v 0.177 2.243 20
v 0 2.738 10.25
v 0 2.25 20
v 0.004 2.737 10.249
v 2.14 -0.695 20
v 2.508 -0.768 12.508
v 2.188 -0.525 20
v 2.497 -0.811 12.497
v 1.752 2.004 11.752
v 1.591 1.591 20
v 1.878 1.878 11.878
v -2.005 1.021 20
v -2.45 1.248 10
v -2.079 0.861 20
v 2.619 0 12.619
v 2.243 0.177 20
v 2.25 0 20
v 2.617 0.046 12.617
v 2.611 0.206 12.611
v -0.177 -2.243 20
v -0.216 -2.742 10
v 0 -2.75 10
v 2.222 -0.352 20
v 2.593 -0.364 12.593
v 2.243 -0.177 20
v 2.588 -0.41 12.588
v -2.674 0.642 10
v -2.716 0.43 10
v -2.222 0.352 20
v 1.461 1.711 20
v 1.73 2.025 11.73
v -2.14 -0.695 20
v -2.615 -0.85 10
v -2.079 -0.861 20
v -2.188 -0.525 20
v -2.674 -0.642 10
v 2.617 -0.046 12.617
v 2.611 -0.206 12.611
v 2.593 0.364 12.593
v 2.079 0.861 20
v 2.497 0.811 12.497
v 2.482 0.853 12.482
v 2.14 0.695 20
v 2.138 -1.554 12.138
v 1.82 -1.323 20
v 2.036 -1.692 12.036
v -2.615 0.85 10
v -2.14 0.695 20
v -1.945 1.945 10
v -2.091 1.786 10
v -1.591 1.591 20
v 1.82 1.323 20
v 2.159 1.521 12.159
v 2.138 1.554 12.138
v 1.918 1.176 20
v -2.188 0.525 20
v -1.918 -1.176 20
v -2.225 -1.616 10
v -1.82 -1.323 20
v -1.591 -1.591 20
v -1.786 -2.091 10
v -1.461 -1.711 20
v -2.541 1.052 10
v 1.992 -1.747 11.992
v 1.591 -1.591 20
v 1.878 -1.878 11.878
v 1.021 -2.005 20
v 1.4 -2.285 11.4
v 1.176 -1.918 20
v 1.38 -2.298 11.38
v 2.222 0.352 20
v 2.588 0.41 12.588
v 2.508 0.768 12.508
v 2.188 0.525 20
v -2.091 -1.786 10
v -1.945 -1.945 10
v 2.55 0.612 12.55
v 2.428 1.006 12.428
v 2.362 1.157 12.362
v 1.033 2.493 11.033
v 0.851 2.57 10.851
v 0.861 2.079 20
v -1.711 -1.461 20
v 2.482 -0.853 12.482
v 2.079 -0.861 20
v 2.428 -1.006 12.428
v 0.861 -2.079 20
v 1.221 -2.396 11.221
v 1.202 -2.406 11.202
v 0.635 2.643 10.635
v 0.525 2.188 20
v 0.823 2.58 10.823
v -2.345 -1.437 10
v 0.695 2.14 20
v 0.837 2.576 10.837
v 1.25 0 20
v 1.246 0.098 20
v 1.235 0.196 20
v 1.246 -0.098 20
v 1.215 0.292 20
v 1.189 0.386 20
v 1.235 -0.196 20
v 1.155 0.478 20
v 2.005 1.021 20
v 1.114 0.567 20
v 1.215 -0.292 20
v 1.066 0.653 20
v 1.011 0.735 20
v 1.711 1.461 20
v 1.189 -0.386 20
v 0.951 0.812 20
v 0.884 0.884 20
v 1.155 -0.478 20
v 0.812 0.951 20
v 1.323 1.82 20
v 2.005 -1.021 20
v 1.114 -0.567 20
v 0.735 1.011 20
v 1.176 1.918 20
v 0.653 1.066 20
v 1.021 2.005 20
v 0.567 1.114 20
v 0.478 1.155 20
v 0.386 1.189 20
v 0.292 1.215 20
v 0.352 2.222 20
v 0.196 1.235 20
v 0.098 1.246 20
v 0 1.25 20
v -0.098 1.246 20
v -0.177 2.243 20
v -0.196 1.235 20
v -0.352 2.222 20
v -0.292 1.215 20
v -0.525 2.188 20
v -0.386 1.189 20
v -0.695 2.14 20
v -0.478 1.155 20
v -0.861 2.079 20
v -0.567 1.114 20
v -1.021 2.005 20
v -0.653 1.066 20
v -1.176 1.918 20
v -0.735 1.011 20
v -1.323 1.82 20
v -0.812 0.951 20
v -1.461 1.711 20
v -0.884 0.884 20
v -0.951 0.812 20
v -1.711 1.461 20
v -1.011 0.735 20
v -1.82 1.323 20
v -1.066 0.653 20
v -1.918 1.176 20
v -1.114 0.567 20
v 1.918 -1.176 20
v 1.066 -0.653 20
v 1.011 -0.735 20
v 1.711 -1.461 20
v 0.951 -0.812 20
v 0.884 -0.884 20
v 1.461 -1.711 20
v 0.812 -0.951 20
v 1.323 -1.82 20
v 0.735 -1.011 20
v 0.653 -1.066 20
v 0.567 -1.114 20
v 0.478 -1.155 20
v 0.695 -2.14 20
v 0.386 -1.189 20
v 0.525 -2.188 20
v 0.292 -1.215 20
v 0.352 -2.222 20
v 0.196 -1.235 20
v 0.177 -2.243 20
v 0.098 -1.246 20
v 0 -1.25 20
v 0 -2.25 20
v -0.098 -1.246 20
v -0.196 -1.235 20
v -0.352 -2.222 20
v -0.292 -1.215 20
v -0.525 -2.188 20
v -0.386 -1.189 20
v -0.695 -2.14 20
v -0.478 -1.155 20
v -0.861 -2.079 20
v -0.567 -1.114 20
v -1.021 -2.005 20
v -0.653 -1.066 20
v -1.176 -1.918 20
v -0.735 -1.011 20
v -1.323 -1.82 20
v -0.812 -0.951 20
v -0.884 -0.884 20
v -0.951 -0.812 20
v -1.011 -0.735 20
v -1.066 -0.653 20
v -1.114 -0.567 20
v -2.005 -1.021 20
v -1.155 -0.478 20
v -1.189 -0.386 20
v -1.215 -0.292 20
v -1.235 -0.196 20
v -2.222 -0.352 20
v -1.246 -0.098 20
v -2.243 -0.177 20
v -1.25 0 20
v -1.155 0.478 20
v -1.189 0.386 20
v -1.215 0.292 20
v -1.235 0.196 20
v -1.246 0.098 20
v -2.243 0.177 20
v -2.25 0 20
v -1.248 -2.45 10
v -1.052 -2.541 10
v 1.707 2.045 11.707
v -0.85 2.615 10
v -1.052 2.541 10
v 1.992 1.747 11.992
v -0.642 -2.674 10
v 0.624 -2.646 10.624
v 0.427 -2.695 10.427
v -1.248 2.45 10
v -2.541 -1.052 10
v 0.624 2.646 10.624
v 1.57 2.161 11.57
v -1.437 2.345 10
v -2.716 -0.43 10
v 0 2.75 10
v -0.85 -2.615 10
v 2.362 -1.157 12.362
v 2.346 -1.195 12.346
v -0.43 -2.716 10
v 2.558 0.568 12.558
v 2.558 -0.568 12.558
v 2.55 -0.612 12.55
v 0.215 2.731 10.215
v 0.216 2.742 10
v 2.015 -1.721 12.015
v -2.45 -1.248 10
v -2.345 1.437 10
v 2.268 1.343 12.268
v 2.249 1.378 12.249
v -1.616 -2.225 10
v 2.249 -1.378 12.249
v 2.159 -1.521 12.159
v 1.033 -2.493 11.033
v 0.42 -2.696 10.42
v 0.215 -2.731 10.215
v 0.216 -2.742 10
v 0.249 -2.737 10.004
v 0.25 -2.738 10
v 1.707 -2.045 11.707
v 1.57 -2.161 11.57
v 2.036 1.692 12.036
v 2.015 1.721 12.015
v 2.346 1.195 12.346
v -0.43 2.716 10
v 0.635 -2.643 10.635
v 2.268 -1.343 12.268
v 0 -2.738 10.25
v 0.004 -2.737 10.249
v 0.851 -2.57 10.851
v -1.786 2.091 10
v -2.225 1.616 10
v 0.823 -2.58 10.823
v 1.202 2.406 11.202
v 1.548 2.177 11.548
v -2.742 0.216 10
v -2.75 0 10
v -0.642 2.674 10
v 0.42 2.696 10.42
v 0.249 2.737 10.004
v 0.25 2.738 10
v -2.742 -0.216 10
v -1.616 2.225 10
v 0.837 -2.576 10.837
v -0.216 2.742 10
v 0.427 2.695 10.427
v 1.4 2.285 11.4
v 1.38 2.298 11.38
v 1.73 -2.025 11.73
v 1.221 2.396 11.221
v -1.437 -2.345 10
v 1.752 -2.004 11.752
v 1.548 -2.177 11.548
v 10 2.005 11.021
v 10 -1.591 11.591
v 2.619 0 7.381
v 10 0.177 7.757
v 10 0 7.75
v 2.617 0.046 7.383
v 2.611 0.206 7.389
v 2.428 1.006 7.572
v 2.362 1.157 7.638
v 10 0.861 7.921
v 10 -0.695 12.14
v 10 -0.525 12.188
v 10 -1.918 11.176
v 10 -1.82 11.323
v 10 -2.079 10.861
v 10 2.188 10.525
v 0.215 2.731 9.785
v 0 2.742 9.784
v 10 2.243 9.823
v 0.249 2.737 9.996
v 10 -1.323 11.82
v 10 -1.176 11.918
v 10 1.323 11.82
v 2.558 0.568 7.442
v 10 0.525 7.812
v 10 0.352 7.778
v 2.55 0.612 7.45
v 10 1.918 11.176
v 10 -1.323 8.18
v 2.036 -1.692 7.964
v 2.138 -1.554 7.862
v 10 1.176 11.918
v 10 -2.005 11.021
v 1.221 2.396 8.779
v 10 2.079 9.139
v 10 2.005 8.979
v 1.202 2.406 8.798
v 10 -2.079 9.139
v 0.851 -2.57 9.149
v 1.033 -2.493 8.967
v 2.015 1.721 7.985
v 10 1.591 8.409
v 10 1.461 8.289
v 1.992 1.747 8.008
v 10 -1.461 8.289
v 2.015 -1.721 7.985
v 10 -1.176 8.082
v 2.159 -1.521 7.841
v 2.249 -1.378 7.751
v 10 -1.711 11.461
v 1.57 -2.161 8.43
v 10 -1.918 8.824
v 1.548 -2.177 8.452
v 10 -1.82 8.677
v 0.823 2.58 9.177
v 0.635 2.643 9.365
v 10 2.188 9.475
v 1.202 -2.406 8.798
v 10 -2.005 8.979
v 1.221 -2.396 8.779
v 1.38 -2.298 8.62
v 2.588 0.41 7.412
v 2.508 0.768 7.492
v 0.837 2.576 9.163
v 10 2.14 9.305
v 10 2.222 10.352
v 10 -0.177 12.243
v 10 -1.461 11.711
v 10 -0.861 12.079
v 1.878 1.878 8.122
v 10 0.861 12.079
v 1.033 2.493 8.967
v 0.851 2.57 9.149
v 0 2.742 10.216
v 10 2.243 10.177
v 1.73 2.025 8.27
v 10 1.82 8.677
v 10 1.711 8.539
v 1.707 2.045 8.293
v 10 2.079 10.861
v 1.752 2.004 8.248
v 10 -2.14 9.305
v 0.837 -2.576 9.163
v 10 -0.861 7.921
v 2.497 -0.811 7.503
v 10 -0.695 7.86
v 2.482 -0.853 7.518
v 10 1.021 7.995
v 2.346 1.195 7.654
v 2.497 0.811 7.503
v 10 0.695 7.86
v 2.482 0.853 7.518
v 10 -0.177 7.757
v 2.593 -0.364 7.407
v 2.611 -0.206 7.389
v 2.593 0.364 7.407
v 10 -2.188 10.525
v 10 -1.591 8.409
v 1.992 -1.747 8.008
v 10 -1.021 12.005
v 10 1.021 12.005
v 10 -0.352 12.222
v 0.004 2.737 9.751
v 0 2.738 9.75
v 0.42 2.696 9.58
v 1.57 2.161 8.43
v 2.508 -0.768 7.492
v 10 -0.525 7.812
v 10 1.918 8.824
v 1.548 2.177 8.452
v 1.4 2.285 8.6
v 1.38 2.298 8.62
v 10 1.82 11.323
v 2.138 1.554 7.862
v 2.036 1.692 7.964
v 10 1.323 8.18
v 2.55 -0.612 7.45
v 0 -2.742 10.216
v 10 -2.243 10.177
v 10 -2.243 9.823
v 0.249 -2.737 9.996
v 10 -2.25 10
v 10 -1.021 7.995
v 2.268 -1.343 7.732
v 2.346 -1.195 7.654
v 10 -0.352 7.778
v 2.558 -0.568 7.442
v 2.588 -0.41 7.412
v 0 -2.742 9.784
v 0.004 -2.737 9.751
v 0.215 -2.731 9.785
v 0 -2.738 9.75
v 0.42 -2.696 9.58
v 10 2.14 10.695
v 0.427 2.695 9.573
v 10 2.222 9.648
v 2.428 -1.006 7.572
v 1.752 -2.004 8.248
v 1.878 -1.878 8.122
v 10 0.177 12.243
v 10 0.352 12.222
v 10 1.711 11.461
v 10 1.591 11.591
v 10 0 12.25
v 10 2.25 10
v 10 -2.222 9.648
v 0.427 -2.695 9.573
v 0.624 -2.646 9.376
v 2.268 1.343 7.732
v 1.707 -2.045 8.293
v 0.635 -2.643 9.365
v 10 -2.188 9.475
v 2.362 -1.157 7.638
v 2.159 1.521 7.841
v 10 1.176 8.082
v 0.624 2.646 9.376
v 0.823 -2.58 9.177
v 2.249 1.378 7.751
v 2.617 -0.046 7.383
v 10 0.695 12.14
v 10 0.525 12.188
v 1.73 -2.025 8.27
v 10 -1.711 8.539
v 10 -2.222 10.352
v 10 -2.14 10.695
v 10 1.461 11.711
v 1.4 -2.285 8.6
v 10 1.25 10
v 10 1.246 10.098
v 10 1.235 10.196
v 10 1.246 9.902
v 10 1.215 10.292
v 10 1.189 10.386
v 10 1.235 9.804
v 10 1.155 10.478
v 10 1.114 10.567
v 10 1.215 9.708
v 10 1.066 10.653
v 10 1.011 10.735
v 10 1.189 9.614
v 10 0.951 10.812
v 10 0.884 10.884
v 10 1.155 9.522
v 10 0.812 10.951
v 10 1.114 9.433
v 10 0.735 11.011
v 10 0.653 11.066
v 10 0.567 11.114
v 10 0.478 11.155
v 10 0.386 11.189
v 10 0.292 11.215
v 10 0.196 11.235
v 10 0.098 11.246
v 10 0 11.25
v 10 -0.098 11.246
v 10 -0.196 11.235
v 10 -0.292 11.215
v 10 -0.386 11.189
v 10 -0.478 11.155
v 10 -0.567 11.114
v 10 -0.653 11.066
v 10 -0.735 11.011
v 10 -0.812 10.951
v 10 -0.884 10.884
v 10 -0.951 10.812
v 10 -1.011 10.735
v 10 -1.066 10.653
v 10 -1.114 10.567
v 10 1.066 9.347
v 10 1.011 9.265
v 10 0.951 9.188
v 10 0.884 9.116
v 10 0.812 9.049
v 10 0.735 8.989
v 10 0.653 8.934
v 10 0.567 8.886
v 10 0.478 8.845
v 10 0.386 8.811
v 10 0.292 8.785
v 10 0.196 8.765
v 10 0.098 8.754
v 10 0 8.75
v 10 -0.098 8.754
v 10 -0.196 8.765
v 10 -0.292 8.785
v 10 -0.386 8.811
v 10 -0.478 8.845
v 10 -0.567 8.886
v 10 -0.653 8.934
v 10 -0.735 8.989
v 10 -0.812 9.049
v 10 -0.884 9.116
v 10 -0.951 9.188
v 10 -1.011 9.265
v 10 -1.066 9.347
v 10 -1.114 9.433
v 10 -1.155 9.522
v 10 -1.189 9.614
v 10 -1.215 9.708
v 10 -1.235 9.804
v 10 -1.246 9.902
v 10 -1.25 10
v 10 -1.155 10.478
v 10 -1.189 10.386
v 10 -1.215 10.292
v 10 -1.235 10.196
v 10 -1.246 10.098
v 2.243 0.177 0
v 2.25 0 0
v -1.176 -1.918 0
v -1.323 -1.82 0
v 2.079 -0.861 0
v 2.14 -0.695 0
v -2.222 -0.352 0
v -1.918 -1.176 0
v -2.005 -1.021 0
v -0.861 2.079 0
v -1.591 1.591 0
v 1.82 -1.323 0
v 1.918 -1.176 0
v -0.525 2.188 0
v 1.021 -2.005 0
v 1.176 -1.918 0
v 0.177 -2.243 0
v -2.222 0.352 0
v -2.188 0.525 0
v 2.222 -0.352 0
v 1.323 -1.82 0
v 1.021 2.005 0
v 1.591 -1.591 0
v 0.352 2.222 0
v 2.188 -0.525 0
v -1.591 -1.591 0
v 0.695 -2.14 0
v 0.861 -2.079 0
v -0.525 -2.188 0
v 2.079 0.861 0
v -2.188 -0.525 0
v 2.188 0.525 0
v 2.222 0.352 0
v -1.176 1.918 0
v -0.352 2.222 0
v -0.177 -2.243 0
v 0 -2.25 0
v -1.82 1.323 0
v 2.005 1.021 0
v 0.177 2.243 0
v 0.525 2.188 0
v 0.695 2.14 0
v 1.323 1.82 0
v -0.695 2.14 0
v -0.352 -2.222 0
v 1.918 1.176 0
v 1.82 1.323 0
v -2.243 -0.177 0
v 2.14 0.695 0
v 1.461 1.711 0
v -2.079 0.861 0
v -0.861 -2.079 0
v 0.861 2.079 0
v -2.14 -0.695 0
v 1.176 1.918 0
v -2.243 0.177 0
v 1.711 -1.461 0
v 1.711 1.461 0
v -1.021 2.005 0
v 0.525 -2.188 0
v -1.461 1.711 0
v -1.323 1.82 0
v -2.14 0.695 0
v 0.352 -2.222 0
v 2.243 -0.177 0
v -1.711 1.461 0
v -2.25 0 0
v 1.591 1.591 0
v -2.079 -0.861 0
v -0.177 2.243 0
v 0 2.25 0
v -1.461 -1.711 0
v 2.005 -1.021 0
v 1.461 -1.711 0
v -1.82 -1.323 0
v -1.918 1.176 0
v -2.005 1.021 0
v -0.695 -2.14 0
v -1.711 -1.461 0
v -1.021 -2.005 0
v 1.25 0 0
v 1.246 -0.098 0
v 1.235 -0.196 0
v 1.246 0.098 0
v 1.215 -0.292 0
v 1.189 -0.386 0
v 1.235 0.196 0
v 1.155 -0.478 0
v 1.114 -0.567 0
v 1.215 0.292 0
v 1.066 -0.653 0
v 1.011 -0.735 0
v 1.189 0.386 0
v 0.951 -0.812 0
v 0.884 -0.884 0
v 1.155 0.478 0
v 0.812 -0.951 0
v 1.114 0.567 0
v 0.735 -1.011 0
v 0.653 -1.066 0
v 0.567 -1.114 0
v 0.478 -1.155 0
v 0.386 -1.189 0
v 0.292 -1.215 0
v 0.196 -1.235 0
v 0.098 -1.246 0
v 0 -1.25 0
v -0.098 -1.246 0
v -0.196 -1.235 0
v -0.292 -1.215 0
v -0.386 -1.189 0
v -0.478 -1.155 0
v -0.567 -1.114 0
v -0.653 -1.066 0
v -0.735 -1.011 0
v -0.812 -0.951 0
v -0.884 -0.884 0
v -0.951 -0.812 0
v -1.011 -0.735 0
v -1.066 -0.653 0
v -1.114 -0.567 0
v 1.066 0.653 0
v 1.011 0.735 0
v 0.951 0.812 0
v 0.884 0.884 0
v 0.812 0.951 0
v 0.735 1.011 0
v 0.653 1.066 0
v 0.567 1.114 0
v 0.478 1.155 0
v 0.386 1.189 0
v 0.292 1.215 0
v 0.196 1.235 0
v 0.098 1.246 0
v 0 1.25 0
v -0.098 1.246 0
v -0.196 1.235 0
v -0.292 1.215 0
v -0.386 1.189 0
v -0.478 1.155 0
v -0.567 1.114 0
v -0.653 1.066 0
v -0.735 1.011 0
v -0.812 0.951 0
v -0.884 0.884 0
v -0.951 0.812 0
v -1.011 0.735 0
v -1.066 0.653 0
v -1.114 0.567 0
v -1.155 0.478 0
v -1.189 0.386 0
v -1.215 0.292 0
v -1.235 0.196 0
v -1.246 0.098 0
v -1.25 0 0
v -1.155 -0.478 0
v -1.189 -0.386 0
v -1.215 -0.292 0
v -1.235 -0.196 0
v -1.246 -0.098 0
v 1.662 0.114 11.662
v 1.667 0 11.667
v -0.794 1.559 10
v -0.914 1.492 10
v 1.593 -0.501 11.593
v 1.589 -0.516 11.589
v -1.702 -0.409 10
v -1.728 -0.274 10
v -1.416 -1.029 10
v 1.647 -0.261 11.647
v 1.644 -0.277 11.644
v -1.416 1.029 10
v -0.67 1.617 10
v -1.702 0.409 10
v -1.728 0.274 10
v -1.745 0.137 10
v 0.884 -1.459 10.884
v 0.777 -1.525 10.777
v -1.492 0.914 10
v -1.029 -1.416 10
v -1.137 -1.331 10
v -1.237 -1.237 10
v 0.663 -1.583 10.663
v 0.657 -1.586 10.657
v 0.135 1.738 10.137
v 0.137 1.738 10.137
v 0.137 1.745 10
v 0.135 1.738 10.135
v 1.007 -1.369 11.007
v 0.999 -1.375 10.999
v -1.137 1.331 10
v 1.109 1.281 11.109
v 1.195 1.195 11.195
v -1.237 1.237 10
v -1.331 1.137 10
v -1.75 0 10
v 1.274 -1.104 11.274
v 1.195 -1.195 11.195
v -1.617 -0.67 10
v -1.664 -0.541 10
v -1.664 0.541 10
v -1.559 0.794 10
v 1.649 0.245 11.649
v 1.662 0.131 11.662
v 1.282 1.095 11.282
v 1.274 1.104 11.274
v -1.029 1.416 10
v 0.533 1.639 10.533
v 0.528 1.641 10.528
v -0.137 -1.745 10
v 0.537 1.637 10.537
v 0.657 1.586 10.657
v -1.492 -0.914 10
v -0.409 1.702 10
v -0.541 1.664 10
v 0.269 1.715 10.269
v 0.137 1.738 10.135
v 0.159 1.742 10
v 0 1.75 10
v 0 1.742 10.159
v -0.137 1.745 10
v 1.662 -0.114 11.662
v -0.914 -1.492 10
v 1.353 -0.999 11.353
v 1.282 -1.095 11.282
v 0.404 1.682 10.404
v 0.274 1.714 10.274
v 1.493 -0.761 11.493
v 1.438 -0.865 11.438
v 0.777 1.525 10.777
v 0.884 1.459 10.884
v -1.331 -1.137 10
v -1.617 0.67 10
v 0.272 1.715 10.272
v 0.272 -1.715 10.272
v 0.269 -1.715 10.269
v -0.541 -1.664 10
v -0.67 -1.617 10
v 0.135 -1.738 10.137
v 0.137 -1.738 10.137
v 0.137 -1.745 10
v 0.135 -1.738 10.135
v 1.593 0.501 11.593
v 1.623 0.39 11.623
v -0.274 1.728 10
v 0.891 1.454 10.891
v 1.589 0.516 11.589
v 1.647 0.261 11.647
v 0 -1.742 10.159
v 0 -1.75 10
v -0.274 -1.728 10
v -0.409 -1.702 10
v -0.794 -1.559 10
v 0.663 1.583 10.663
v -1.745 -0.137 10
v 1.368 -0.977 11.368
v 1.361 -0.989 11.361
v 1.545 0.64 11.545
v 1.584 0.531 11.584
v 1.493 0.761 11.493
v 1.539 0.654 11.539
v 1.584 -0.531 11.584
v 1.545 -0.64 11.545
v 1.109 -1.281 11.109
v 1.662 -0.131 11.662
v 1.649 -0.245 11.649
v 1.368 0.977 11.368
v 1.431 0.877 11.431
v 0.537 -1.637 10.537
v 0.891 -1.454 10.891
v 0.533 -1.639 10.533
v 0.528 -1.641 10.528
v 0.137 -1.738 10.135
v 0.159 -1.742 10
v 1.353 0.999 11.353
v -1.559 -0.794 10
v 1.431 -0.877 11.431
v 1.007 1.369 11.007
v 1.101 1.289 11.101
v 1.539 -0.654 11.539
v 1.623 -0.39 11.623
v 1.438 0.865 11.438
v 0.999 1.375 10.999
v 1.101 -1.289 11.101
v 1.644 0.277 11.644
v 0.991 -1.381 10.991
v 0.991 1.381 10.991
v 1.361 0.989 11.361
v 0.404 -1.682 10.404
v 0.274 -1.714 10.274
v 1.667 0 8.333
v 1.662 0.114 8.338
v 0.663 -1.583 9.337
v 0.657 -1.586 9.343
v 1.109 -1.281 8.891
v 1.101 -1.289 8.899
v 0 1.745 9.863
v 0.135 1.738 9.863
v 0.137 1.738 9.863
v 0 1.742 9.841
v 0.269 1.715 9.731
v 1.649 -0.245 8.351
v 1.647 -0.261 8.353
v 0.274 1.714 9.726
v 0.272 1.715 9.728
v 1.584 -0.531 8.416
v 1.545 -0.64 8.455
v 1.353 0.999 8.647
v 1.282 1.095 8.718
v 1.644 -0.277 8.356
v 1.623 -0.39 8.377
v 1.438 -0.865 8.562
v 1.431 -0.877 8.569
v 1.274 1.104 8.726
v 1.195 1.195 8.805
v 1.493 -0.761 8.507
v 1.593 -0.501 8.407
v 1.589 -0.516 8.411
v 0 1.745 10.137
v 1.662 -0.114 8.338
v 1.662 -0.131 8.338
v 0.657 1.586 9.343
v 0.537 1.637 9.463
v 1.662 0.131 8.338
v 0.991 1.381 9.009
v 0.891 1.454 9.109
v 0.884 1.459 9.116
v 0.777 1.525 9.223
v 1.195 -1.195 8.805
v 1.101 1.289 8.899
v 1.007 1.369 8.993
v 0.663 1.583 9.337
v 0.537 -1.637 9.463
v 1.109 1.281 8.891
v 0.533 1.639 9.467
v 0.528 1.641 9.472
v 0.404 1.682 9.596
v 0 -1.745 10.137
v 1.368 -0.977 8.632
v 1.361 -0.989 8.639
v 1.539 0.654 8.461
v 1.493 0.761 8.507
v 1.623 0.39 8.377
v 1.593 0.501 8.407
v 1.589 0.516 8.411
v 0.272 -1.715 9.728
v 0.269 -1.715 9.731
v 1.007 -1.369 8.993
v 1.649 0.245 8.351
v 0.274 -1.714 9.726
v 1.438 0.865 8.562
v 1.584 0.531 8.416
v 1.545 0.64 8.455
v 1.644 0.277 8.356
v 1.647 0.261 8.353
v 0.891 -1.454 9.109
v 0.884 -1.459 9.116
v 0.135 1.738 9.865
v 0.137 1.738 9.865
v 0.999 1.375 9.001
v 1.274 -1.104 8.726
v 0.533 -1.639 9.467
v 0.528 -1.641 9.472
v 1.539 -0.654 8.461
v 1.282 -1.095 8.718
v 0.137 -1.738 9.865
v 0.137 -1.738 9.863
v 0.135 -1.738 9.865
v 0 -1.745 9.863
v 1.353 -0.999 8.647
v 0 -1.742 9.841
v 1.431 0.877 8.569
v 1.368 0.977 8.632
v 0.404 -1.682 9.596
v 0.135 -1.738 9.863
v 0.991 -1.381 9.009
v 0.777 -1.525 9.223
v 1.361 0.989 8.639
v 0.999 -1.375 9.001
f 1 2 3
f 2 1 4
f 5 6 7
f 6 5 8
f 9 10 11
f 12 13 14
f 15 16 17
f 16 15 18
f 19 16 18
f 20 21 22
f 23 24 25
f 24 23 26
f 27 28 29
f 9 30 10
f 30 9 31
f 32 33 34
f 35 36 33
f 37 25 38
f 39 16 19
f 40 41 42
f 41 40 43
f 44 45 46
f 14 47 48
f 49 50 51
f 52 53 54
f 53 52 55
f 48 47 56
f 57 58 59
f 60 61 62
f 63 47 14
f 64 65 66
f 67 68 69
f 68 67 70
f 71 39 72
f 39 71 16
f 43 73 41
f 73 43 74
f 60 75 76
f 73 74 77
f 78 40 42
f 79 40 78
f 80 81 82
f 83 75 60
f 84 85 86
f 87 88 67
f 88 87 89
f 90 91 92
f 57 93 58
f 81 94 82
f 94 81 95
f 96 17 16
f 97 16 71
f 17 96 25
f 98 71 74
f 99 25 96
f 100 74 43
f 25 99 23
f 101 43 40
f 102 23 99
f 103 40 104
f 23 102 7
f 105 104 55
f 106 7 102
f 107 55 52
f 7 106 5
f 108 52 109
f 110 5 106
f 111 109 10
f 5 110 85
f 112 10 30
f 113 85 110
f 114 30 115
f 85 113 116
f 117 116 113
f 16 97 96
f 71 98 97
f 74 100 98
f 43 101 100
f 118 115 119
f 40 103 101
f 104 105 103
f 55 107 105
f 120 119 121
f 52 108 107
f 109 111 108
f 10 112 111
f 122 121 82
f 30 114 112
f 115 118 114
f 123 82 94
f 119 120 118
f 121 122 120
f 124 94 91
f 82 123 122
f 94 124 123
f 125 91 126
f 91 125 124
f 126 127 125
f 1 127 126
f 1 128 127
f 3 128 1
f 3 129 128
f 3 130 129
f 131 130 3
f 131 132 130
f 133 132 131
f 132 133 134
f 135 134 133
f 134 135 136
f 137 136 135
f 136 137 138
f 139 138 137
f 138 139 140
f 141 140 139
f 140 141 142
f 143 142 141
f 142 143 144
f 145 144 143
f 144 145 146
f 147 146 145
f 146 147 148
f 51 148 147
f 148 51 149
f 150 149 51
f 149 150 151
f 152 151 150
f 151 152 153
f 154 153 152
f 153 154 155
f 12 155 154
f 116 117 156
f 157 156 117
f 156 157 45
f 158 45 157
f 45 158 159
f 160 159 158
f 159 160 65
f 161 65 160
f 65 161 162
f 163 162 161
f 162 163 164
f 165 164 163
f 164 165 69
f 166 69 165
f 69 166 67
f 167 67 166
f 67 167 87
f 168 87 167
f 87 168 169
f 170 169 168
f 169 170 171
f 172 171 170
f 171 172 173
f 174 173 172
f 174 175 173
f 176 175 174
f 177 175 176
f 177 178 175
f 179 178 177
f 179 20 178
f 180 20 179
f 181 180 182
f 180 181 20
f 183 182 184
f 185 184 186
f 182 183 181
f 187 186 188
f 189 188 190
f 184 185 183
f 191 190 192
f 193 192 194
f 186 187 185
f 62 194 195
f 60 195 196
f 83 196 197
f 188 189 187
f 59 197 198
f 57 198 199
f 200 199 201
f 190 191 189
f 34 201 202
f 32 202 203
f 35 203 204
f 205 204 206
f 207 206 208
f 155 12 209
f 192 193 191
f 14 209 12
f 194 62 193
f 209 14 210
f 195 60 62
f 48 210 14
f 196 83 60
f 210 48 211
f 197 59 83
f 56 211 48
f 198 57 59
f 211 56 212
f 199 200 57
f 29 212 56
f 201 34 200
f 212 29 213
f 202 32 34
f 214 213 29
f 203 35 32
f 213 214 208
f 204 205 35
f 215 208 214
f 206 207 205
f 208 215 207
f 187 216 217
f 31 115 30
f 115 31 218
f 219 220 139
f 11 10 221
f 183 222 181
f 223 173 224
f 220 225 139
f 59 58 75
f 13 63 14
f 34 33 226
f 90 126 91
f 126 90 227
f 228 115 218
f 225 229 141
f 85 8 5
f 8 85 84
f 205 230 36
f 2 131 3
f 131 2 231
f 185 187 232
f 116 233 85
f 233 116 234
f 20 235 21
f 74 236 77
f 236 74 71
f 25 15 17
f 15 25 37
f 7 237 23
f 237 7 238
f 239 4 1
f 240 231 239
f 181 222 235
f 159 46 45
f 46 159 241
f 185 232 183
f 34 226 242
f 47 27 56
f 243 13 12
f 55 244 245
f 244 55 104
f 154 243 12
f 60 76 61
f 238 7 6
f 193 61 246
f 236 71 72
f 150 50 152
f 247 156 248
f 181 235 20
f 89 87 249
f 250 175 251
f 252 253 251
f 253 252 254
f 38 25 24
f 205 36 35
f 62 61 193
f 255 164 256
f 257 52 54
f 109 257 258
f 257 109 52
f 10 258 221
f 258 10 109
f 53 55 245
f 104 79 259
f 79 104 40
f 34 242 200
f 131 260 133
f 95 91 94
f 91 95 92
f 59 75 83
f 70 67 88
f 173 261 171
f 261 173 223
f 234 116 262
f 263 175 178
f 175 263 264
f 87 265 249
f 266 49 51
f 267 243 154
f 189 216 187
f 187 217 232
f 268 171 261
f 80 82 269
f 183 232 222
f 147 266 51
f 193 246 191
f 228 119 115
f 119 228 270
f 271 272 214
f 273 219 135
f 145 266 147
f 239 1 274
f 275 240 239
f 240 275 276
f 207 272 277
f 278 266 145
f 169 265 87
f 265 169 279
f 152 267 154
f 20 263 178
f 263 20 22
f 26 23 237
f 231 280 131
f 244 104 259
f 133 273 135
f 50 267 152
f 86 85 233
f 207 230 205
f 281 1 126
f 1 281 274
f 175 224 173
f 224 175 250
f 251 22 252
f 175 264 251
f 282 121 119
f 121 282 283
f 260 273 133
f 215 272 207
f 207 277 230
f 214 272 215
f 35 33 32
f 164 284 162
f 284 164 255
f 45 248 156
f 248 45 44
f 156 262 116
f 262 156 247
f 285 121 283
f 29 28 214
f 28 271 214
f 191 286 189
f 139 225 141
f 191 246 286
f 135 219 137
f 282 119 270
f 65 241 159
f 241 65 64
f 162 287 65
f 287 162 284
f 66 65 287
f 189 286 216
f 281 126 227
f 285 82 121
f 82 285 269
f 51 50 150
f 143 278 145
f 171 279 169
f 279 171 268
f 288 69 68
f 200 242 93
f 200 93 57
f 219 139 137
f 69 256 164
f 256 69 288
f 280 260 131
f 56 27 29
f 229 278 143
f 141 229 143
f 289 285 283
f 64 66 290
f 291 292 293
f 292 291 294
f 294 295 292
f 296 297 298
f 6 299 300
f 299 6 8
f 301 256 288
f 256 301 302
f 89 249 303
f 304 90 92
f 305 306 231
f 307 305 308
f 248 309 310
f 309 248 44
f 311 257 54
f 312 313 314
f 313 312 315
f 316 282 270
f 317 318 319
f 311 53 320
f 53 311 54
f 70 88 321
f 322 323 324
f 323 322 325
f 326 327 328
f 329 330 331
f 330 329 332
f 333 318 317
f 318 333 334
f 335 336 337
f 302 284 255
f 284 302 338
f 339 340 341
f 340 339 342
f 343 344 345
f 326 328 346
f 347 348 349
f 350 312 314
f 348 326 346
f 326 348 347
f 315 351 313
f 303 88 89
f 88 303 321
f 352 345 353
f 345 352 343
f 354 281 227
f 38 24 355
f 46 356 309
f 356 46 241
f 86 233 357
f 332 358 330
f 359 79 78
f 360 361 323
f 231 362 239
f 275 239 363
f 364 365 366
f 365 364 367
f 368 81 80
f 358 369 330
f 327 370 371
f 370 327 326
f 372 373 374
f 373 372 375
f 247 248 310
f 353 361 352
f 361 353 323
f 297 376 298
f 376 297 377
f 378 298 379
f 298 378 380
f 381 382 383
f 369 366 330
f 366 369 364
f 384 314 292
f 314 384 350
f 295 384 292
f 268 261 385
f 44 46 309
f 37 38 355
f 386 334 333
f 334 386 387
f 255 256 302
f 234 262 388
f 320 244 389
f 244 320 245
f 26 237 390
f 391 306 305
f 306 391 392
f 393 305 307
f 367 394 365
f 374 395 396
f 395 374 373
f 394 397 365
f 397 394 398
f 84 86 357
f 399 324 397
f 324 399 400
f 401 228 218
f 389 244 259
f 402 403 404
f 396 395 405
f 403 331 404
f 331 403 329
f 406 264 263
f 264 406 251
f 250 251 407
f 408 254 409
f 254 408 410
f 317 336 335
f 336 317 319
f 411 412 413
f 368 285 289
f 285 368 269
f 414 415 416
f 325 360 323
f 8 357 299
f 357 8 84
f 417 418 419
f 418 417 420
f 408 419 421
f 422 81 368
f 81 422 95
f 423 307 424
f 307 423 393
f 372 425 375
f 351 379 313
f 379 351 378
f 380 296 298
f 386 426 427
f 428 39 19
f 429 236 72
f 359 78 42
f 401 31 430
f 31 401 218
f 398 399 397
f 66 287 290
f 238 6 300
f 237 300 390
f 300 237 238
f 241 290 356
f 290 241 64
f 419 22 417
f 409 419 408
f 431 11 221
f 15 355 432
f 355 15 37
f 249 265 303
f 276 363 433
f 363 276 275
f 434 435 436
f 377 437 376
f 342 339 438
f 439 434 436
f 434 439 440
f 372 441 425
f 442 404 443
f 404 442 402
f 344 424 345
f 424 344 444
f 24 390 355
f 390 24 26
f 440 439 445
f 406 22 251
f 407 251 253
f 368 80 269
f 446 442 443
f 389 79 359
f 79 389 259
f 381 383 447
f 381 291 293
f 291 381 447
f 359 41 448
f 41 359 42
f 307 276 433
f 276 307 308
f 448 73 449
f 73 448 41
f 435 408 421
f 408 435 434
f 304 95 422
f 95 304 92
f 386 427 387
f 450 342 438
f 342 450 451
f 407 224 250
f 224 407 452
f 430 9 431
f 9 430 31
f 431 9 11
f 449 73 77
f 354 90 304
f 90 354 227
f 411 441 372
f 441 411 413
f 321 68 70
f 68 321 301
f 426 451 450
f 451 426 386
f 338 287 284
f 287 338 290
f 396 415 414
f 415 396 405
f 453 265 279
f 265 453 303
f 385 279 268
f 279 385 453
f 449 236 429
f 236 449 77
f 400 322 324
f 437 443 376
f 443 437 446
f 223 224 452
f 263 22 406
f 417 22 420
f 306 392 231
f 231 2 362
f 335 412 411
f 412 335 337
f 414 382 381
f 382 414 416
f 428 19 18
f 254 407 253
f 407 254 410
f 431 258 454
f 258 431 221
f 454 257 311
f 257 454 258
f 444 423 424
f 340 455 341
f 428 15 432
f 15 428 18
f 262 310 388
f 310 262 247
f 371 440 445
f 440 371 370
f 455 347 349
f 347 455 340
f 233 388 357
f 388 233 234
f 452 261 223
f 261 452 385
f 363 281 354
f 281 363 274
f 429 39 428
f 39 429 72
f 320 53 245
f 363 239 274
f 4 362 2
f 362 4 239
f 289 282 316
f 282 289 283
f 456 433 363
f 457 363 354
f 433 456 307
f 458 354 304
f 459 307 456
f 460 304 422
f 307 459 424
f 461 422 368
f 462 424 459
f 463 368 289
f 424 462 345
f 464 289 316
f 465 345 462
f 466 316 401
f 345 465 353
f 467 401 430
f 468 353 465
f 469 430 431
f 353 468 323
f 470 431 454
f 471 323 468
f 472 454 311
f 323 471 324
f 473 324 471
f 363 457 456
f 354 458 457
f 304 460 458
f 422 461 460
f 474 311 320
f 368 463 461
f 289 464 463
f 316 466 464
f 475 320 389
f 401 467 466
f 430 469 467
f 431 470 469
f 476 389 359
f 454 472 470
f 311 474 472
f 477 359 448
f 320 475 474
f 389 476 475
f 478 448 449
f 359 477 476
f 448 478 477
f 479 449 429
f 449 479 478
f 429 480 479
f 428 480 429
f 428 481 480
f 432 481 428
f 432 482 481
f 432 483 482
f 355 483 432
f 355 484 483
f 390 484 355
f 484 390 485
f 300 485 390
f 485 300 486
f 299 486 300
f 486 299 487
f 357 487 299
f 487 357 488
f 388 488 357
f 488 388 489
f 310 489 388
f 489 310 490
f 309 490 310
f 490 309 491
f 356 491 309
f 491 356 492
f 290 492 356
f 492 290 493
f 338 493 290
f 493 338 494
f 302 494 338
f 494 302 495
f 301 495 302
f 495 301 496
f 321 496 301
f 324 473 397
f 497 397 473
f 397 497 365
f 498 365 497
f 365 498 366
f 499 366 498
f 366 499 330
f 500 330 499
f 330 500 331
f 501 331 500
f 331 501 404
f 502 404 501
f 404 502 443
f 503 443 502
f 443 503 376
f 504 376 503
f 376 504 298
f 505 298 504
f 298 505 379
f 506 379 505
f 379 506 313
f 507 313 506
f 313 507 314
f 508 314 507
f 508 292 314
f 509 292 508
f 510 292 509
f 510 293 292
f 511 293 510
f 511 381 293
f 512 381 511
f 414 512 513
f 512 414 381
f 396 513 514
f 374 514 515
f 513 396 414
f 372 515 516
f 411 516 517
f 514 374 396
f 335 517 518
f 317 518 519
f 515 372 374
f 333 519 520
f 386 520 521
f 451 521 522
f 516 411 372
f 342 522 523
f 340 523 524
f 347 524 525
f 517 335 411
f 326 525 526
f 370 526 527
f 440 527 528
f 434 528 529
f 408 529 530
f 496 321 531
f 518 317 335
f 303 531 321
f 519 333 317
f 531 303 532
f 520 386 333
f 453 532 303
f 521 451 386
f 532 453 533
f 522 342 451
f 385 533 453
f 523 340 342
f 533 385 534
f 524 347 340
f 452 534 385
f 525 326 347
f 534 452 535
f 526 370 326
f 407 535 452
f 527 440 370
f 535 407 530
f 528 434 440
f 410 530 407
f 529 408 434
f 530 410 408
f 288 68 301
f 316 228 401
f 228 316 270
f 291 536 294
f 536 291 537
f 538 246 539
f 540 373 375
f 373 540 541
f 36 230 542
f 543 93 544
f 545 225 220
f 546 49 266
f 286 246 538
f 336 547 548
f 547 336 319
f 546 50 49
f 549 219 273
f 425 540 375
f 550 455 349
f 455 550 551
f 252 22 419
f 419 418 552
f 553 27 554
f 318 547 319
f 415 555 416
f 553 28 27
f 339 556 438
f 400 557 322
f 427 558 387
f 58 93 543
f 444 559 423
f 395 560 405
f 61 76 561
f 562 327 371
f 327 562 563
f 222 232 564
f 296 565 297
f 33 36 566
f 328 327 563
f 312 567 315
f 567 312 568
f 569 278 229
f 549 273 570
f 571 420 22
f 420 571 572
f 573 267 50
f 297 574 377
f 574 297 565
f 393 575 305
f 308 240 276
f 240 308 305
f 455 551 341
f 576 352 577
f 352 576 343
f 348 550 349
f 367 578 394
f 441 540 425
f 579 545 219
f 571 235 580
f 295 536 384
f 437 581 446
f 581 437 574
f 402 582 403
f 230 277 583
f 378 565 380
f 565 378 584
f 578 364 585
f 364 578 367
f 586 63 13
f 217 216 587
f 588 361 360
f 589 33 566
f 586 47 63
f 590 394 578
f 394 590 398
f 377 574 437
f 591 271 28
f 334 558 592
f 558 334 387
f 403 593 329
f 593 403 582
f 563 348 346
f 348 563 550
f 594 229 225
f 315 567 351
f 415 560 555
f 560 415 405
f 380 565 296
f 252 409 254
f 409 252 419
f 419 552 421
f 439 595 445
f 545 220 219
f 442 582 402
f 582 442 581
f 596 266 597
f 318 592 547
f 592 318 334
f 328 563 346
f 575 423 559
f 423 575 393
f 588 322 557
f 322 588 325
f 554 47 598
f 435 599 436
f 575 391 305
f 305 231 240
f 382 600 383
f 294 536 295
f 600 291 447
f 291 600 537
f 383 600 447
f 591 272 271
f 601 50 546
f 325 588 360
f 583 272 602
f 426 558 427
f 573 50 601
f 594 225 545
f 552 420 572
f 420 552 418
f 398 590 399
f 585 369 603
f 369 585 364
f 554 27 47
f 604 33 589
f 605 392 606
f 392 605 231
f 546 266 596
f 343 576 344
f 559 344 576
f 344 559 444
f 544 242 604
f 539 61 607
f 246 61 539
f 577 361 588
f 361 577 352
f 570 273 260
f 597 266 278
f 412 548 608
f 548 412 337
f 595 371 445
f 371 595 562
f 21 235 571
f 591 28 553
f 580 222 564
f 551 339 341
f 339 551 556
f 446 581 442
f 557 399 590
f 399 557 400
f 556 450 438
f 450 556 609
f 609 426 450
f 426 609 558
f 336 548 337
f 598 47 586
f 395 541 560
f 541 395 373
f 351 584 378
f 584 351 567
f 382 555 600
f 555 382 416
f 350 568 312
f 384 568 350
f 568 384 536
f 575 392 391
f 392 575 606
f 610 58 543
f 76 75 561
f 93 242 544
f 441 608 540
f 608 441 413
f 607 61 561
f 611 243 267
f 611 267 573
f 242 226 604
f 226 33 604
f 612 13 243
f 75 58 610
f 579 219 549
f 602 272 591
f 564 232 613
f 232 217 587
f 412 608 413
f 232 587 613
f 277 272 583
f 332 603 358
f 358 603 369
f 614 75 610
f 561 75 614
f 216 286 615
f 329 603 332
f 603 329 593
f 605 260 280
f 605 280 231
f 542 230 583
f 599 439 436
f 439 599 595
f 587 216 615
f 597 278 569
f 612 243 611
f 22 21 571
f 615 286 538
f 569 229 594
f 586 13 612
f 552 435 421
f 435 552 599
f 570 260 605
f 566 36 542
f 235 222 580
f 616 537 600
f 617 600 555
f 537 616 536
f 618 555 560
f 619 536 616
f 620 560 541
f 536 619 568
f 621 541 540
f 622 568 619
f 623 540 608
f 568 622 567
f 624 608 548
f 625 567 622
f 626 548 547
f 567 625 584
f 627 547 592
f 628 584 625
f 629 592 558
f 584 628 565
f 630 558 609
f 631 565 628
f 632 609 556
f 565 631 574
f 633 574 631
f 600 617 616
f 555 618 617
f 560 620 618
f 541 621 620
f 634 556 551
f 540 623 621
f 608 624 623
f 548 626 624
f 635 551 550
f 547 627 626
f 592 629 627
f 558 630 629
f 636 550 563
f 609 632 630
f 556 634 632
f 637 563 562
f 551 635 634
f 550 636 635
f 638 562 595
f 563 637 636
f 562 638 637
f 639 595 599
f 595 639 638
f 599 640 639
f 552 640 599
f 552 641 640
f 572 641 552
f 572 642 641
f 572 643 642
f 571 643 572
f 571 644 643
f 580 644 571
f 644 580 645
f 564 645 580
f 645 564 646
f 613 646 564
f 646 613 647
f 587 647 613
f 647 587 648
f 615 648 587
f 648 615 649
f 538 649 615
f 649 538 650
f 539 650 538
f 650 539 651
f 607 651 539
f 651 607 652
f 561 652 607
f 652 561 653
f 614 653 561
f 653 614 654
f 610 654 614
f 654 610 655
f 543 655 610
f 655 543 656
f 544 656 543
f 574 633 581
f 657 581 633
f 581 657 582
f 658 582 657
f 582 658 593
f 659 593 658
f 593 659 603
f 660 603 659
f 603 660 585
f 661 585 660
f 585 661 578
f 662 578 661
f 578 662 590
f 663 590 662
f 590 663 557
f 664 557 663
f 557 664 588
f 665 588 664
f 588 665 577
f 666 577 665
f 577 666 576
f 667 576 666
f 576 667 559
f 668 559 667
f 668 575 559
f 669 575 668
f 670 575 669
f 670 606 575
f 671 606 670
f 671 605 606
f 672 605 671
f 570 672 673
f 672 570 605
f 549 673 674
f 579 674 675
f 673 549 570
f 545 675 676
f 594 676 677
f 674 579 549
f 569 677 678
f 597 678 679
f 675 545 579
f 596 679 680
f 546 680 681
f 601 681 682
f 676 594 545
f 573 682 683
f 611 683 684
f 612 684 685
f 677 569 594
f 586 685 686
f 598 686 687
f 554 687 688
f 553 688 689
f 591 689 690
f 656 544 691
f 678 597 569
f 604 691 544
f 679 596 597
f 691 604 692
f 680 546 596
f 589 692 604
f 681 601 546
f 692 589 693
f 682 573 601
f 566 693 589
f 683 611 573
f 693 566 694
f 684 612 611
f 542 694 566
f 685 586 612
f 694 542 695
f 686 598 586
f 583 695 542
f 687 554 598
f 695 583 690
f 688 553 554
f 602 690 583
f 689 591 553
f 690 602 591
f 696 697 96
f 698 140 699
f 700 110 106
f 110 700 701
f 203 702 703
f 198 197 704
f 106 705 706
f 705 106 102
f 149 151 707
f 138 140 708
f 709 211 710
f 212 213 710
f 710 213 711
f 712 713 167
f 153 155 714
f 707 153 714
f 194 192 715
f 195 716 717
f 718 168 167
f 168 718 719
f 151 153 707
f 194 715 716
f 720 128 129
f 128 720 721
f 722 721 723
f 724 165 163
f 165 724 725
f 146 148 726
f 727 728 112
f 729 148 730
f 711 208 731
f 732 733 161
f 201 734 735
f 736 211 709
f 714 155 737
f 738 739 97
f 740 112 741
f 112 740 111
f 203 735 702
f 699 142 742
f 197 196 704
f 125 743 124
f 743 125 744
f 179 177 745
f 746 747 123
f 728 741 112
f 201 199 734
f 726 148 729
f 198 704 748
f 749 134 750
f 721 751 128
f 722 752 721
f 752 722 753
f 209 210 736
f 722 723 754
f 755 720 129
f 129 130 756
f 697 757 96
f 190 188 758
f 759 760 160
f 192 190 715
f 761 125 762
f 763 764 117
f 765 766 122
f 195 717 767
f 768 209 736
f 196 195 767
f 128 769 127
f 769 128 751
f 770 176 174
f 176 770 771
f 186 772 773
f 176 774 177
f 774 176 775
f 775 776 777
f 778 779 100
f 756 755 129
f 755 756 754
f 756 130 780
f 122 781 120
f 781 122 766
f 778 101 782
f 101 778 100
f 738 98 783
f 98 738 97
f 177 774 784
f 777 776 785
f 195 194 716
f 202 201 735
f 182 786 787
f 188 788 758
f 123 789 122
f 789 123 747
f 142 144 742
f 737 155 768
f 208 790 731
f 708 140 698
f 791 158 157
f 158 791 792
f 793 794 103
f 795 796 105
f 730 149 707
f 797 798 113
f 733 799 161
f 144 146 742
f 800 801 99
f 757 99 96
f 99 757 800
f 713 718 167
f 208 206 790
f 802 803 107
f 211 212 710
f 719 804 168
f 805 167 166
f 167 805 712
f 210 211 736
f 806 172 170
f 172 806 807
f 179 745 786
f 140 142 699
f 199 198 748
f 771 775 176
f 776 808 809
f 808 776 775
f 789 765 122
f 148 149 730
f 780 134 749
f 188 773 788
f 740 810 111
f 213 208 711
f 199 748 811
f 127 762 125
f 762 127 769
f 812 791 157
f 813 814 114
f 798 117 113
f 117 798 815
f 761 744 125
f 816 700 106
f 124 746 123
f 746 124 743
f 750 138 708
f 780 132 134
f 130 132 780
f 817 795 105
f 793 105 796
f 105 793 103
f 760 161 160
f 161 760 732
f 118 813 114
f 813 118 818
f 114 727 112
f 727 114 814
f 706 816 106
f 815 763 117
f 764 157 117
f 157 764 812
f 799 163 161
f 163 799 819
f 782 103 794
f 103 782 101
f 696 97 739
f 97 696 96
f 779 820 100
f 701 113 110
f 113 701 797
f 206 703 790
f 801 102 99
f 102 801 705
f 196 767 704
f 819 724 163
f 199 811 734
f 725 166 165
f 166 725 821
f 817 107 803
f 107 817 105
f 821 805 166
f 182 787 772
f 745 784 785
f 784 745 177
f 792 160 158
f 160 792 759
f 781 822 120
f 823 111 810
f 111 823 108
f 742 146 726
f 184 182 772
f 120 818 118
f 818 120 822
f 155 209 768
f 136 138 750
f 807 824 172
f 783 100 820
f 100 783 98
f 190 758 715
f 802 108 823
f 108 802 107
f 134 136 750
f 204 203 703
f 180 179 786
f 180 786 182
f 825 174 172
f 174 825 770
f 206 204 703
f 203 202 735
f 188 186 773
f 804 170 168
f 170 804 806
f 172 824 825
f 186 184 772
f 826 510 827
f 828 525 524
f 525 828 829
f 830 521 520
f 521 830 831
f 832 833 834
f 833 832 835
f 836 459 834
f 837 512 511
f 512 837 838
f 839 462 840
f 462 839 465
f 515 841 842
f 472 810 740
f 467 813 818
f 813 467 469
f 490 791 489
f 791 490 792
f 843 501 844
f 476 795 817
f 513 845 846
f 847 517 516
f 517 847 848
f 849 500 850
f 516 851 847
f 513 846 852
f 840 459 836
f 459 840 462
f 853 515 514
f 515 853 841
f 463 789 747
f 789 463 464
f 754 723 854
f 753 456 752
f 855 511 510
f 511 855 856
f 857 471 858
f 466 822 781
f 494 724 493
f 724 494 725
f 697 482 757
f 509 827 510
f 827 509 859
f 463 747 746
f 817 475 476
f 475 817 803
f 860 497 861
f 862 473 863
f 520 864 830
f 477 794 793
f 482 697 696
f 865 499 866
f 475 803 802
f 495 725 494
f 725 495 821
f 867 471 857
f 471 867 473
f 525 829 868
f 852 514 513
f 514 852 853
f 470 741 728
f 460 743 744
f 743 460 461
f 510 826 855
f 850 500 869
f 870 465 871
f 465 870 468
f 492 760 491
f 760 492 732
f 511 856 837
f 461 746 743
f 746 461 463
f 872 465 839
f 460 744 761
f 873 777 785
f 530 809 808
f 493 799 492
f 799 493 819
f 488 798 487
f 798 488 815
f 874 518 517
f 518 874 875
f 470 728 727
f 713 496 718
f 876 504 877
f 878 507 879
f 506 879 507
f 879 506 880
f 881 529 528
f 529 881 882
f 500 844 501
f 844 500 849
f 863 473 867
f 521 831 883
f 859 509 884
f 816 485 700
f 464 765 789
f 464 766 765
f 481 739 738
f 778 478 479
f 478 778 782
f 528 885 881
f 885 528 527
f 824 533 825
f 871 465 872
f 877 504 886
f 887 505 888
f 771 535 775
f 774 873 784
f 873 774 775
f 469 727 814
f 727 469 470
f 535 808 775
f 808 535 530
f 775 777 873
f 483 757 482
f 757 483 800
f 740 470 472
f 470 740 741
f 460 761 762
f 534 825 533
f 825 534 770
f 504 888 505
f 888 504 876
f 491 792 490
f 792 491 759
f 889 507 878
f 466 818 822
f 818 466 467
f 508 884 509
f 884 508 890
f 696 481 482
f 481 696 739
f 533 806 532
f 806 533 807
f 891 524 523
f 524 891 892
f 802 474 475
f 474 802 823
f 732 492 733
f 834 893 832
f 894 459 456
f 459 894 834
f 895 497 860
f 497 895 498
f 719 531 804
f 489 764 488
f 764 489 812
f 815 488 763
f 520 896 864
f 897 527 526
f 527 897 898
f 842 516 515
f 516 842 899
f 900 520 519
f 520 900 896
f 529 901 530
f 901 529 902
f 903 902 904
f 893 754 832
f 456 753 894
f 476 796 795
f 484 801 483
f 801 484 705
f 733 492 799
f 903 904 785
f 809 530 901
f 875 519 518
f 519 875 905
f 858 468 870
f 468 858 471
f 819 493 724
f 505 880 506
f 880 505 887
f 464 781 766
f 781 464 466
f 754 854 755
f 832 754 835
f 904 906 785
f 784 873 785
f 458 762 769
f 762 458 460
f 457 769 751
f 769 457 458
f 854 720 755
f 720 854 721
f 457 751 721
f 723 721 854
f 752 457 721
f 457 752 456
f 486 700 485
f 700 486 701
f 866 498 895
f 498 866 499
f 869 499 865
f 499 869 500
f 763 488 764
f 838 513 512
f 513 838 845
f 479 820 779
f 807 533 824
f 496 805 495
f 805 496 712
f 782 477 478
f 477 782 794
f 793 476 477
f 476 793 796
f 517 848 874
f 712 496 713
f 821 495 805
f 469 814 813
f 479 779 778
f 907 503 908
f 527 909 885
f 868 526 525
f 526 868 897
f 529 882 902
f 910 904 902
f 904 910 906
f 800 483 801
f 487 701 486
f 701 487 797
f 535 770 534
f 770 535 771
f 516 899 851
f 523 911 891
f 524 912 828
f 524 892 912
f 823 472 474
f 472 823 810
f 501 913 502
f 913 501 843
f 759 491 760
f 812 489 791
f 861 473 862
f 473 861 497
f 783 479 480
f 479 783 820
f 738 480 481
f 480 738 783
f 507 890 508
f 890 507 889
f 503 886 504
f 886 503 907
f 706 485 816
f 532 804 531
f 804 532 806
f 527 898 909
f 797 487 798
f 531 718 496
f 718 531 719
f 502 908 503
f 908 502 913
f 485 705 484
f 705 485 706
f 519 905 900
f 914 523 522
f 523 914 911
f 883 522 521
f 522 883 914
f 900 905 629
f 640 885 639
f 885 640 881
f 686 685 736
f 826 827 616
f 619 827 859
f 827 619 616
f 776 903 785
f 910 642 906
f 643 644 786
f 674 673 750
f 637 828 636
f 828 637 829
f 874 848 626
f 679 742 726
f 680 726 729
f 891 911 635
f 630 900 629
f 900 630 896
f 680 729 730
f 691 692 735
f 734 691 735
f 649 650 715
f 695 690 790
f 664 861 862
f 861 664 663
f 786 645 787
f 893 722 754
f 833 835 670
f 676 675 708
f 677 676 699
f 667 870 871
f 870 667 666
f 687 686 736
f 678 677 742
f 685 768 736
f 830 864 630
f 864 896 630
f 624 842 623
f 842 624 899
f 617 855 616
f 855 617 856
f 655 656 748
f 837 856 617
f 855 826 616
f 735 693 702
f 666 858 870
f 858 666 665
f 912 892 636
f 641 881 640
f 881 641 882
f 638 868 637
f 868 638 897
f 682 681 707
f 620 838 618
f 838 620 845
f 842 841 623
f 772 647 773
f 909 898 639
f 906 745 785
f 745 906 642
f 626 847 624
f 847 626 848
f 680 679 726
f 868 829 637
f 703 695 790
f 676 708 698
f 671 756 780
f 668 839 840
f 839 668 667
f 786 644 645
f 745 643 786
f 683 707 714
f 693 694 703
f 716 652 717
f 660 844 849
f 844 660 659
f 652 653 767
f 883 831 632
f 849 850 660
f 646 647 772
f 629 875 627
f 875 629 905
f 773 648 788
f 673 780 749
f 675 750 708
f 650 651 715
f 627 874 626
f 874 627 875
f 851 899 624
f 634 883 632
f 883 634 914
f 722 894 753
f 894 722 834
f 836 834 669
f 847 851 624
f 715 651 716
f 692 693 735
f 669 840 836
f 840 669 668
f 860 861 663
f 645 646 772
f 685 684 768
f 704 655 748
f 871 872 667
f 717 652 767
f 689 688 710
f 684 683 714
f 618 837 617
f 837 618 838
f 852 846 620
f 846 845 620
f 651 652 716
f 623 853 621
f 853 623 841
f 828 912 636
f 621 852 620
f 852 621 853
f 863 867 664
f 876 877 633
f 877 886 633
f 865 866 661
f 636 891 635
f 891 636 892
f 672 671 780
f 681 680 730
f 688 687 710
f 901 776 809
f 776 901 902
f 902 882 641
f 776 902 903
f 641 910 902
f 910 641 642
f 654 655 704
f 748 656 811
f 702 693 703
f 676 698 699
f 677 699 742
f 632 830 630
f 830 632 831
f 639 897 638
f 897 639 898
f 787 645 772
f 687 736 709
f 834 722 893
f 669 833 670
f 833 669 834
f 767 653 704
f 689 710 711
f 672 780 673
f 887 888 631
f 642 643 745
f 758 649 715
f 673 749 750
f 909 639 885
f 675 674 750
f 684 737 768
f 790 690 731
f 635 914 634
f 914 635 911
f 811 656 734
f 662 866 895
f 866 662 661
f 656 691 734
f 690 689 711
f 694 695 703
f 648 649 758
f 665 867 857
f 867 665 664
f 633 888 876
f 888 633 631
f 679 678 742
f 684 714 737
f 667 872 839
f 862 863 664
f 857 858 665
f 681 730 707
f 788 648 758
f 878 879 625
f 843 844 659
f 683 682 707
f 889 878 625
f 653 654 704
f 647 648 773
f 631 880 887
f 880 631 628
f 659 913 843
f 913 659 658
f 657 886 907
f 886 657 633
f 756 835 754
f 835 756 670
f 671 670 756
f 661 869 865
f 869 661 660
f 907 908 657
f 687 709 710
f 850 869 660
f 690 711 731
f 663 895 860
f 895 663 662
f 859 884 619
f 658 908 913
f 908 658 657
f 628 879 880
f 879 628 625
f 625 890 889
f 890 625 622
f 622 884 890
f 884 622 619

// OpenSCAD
$fn = 80;
r1 = 4.5/2;
r2 = 5.5/2;
t = 1;
h = 10;

difference(){
union(){
	cylinder(r1=r1,r2=r2,h=h);
	translate([0,0,h]){
	cylinder(r2=r1,r1=r2,h=h);
	rotate(a=[0,90,0])
	cylinder(r2=r1,r1=r2,h=h);
	}
}
	translate([0,0,h]){
	cylinder(r2=r1-t,r1=r2-t,h=h);
	rotate(a=[0,90,0])
	cylinder(r2=r1-t,r1=r2-t,h=h);
	}
	cylinder(r1=r1-t,r2=r2-t,h=h);
}
